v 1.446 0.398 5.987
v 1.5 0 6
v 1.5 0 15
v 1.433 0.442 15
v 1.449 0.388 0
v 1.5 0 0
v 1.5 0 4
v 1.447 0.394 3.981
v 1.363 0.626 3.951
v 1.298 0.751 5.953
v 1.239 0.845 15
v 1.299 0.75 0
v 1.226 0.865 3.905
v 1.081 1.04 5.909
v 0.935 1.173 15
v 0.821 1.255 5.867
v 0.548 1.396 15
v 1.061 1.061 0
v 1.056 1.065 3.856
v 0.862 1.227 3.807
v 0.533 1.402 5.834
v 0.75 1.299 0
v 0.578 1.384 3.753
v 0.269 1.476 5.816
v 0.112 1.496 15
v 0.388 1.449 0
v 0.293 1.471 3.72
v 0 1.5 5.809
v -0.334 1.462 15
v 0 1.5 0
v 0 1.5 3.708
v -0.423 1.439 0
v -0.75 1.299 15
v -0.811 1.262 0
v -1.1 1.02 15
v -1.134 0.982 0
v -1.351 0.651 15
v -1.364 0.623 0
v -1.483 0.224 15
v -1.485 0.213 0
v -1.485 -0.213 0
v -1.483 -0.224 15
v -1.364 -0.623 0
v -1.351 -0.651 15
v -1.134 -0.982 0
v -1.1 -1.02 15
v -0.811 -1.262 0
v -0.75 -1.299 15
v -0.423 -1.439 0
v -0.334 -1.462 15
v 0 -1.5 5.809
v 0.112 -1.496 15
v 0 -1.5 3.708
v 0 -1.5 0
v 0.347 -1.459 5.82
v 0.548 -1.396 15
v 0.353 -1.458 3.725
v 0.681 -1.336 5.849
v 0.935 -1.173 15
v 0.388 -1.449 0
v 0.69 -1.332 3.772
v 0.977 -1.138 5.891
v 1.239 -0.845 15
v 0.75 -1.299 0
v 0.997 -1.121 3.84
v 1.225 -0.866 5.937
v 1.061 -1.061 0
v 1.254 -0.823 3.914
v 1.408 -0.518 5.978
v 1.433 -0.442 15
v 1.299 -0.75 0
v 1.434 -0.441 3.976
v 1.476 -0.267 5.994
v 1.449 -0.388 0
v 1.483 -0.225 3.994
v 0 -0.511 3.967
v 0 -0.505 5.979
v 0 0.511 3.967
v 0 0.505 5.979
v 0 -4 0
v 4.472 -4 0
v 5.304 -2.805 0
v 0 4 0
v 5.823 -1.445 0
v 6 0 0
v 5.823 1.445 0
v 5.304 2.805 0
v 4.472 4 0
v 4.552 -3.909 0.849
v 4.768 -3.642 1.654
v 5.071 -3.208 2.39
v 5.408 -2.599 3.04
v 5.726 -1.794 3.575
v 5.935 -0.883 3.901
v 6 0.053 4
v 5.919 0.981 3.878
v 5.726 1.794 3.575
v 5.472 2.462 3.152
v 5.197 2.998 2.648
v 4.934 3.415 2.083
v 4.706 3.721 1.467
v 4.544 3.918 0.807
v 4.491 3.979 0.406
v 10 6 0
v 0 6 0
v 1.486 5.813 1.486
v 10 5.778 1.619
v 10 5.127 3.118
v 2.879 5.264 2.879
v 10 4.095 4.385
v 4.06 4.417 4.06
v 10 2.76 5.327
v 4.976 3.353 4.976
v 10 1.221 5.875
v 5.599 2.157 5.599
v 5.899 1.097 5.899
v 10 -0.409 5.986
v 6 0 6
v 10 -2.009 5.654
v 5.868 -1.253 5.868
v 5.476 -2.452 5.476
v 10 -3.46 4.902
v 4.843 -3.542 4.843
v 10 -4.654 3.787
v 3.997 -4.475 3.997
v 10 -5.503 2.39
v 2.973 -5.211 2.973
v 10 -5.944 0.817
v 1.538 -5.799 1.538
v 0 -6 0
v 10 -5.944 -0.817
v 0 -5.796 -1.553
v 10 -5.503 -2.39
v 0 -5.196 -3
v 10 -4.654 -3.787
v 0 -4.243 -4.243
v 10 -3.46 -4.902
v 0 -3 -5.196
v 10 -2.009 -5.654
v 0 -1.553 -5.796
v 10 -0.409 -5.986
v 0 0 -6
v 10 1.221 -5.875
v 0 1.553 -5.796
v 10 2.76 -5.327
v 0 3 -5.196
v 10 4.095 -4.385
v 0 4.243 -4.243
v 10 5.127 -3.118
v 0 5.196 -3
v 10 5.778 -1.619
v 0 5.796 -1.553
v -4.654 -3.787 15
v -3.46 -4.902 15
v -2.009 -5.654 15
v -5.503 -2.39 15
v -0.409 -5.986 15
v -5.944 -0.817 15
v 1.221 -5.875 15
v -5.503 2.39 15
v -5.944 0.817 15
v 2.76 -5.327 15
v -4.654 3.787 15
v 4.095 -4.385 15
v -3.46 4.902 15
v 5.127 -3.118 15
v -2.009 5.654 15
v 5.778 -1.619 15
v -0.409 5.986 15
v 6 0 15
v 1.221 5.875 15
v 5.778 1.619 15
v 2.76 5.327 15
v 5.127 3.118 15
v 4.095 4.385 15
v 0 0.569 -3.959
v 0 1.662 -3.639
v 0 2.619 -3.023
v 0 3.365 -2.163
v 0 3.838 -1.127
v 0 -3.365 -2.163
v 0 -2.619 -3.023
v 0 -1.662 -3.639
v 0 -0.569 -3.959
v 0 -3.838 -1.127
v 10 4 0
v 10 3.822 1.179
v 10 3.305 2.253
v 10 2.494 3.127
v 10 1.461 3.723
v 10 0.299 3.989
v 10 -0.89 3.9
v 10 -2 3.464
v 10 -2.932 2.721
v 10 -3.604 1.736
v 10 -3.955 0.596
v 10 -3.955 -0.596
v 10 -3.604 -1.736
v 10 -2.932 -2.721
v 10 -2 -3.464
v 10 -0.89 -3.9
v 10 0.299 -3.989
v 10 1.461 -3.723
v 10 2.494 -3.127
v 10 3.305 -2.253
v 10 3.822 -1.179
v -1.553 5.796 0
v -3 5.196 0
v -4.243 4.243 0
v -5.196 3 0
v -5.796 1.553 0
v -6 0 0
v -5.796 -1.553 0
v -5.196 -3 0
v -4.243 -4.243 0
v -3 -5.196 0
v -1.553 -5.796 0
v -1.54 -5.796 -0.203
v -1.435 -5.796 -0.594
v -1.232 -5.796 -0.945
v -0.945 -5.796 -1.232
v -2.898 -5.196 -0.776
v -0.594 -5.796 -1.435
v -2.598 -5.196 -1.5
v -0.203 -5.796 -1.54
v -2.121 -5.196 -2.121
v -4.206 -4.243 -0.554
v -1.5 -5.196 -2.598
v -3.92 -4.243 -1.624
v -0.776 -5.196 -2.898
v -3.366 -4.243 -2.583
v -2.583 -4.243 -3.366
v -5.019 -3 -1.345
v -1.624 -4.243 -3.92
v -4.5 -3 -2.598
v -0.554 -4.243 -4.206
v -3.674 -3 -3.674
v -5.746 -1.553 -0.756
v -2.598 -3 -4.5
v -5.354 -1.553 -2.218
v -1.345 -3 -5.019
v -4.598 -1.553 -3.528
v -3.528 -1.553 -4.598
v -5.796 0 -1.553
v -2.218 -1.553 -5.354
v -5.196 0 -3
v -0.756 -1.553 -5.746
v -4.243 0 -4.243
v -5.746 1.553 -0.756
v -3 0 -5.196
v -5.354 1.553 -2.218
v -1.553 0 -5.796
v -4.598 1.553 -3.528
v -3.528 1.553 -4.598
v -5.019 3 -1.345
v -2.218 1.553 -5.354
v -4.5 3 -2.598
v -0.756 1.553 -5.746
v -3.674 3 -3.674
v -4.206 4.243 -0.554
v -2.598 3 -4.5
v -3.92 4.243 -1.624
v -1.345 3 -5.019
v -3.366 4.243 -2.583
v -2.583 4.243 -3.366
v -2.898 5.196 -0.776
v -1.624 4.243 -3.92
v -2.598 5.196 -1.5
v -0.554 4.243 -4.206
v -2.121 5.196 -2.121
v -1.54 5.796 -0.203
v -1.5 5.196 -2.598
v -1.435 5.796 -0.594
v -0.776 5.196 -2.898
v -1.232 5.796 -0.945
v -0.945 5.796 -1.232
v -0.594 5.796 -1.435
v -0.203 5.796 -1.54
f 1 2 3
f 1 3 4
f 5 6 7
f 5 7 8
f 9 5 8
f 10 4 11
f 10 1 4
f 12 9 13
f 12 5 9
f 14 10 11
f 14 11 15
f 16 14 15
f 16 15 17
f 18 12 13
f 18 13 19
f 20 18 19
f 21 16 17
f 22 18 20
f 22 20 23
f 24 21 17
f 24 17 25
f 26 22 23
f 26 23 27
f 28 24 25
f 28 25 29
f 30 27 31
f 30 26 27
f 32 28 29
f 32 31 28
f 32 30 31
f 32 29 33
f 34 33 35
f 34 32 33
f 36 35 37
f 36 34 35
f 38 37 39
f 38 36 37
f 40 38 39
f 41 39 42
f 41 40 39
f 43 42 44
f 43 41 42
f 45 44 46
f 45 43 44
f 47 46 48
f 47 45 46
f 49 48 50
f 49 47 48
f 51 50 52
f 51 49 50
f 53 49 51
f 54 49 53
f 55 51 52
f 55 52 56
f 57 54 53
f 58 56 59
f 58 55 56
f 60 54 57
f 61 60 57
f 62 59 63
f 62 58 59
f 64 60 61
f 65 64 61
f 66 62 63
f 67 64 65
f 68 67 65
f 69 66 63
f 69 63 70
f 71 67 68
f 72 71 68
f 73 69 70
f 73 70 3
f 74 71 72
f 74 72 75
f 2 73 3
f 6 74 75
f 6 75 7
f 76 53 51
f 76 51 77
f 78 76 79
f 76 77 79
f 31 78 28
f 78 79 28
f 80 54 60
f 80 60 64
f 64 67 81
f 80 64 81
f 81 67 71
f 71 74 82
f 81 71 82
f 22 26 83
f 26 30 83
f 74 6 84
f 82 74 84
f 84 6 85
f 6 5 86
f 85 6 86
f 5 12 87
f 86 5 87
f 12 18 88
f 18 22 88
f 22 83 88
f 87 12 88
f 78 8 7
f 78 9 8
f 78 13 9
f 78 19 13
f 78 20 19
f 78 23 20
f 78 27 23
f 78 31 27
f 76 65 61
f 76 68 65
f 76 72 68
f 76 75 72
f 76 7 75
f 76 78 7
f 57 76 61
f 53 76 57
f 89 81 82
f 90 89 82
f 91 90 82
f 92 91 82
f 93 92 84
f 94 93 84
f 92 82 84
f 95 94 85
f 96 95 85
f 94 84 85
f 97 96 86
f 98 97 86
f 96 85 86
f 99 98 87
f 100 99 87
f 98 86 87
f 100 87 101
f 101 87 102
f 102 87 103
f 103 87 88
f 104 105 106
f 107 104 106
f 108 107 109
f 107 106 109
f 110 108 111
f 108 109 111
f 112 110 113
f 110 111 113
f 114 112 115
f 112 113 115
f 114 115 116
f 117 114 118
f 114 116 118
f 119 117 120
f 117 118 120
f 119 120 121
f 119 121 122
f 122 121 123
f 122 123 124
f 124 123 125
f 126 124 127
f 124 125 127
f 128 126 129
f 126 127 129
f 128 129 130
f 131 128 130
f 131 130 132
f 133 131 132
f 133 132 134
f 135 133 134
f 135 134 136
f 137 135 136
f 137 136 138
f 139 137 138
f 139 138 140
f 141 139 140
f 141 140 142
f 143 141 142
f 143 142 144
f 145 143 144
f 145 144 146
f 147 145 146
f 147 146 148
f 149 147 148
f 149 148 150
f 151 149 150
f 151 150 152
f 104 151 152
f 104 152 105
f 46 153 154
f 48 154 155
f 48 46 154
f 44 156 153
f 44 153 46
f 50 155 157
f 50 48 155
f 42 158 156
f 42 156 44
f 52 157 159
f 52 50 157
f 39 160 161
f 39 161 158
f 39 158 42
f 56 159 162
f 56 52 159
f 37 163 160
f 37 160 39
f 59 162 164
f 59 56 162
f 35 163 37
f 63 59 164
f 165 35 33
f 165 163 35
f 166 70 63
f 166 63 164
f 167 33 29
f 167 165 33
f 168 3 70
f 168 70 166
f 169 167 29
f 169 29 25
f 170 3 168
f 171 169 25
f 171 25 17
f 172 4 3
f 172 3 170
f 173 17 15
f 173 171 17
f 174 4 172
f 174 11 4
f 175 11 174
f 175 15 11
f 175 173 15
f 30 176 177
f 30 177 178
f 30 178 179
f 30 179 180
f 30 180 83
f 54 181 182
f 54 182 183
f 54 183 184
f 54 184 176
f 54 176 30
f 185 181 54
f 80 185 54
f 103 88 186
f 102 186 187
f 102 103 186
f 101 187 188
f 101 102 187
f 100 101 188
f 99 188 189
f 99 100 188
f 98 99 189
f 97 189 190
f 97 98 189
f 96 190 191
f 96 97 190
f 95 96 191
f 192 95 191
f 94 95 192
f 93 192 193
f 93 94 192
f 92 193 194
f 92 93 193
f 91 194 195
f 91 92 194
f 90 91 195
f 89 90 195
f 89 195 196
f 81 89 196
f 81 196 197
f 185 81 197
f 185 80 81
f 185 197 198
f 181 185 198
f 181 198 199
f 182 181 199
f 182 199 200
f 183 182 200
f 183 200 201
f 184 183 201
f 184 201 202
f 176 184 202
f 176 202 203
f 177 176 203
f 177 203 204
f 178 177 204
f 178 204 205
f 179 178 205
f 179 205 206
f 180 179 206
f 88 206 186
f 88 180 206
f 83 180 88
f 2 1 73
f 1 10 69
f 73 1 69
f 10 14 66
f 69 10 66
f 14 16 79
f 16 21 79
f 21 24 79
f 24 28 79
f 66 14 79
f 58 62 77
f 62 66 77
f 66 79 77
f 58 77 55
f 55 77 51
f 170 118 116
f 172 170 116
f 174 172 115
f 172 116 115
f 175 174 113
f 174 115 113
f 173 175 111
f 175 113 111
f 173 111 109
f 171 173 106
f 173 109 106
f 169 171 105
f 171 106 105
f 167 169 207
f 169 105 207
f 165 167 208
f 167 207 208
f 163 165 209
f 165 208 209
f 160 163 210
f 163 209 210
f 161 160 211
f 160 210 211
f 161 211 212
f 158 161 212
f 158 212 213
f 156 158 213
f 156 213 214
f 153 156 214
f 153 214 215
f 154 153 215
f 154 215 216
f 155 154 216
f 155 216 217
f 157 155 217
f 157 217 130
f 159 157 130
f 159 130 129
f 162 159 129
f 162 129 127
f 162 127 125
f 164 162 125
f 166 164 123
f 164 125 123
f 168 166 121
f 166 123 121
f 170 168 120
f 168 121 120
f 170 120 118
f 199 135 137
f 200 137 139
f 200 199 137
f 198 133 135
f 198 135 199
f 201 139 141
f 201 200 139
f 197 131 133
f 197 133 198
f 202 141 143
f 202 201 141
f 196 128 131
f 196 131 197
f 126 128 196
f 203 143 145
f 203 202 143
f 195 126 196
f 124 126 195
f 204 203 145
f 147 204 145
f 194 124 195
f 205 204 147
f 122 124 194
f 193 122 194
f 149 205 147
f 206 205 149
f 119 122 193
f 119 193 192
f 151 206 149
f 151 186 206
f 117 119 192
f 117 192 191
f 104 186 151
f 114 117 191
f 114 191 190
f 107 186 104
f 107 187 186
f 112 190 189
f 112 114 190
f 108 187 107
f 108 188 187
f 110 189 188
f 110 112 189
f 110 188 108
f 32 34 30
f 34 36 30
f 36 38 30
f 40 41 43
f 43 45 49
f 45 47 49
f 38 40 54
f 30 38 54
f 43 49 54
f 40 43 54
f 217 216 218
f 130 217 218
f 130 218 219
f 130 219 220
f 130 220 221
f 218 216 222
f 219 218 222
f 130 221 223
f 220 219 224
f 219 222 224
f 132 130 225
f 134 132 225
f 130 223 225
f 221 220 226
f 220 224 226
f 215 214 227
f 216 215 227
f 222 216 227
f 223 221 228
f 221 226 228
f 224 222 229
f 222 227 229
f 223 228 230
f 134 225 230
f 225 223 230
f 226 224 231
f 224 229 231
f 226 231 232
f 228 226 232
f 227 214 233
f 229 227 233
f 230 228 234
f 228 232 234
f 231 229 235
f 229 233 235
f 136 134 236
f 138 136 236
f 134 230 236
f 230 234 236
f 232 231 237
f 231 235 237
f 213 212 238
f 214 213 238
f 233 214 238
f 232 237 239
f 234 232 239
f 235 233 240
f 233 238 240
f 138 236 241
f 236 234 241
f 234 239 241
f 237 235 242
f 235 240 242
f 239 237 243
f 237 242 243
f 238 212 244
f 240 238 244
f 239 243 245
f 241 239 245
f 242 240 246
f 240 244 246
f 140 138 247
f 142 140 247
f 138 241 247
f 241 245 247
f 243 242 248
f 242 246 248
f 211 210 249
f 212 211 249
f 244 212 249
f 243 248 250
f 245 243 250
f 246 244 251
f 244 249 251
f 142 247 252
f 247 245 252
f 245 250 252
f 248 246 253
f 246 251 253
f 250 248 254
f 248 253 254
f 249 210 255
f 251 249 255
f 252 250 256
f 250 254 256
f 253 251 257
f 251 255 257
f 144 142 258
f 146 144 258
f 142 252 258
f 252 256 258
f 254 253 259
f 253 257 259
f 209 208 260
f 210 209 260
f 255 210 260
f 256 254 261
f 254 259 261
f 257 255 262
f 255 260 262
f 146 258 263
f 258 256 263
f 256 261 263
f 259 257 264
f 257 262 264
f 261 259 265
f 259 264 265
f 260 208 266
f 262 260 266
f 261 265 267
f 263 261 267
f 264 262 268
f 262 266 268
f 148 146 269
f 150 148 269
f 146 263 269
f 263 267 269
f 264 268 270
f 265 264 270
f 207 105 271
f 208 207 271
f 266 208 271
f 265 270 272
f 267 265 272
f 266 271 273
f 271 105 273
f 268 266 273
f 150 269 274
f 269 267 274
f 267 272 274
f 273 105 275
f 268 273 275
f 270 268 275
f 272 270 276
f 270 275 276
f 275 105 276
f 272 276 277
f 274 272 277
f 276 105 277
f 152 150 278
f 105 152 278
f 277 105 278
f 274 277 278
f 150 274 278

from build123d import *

# Parameters (mm, degrees)
F0_R     = 6
F0_R_2   = 1.5
F1_DEPTH = 15
F2_R     = 6
F2_R_2   = 4
F3_DEPTH = 10
F6_ANGLE = 90


with BuildPart() as f1:
    # F0 (on Top) → F1 (new body)
    with BuildSketch(Plane.XY):
        Circle(F0_R)
        Circle(F0_R_2, mode=Mode.SUBTRACT)
    extrude(amount=F1_DEPTH)

    # F2 (on Right) → F3 (join)
    with BuildSketch(Plane.YZ):
        Circle(F2_R)
        Circle(F2_R_2, mode=Mode.SUBTRACT)
    extrude(amount=F3_DEPTH)

    # F4 (on face) → F6 (revolve)
    with BuildSketch(Plane(origin=(0, 0, 0), x_dir=(1, 0, 0), z_dir=(0, 0, -1))):
        with BuildLine():
            Line((0, -6), (0, 6))
            ThreePointArc((0, 6), (-6, 0), (0, -6))
        make_face()
    revolve(axis=Axis((0, -1.910034, 0), (0, -1, 0)), revolution_arc=F6_ANGLE)


solid = f1.part
